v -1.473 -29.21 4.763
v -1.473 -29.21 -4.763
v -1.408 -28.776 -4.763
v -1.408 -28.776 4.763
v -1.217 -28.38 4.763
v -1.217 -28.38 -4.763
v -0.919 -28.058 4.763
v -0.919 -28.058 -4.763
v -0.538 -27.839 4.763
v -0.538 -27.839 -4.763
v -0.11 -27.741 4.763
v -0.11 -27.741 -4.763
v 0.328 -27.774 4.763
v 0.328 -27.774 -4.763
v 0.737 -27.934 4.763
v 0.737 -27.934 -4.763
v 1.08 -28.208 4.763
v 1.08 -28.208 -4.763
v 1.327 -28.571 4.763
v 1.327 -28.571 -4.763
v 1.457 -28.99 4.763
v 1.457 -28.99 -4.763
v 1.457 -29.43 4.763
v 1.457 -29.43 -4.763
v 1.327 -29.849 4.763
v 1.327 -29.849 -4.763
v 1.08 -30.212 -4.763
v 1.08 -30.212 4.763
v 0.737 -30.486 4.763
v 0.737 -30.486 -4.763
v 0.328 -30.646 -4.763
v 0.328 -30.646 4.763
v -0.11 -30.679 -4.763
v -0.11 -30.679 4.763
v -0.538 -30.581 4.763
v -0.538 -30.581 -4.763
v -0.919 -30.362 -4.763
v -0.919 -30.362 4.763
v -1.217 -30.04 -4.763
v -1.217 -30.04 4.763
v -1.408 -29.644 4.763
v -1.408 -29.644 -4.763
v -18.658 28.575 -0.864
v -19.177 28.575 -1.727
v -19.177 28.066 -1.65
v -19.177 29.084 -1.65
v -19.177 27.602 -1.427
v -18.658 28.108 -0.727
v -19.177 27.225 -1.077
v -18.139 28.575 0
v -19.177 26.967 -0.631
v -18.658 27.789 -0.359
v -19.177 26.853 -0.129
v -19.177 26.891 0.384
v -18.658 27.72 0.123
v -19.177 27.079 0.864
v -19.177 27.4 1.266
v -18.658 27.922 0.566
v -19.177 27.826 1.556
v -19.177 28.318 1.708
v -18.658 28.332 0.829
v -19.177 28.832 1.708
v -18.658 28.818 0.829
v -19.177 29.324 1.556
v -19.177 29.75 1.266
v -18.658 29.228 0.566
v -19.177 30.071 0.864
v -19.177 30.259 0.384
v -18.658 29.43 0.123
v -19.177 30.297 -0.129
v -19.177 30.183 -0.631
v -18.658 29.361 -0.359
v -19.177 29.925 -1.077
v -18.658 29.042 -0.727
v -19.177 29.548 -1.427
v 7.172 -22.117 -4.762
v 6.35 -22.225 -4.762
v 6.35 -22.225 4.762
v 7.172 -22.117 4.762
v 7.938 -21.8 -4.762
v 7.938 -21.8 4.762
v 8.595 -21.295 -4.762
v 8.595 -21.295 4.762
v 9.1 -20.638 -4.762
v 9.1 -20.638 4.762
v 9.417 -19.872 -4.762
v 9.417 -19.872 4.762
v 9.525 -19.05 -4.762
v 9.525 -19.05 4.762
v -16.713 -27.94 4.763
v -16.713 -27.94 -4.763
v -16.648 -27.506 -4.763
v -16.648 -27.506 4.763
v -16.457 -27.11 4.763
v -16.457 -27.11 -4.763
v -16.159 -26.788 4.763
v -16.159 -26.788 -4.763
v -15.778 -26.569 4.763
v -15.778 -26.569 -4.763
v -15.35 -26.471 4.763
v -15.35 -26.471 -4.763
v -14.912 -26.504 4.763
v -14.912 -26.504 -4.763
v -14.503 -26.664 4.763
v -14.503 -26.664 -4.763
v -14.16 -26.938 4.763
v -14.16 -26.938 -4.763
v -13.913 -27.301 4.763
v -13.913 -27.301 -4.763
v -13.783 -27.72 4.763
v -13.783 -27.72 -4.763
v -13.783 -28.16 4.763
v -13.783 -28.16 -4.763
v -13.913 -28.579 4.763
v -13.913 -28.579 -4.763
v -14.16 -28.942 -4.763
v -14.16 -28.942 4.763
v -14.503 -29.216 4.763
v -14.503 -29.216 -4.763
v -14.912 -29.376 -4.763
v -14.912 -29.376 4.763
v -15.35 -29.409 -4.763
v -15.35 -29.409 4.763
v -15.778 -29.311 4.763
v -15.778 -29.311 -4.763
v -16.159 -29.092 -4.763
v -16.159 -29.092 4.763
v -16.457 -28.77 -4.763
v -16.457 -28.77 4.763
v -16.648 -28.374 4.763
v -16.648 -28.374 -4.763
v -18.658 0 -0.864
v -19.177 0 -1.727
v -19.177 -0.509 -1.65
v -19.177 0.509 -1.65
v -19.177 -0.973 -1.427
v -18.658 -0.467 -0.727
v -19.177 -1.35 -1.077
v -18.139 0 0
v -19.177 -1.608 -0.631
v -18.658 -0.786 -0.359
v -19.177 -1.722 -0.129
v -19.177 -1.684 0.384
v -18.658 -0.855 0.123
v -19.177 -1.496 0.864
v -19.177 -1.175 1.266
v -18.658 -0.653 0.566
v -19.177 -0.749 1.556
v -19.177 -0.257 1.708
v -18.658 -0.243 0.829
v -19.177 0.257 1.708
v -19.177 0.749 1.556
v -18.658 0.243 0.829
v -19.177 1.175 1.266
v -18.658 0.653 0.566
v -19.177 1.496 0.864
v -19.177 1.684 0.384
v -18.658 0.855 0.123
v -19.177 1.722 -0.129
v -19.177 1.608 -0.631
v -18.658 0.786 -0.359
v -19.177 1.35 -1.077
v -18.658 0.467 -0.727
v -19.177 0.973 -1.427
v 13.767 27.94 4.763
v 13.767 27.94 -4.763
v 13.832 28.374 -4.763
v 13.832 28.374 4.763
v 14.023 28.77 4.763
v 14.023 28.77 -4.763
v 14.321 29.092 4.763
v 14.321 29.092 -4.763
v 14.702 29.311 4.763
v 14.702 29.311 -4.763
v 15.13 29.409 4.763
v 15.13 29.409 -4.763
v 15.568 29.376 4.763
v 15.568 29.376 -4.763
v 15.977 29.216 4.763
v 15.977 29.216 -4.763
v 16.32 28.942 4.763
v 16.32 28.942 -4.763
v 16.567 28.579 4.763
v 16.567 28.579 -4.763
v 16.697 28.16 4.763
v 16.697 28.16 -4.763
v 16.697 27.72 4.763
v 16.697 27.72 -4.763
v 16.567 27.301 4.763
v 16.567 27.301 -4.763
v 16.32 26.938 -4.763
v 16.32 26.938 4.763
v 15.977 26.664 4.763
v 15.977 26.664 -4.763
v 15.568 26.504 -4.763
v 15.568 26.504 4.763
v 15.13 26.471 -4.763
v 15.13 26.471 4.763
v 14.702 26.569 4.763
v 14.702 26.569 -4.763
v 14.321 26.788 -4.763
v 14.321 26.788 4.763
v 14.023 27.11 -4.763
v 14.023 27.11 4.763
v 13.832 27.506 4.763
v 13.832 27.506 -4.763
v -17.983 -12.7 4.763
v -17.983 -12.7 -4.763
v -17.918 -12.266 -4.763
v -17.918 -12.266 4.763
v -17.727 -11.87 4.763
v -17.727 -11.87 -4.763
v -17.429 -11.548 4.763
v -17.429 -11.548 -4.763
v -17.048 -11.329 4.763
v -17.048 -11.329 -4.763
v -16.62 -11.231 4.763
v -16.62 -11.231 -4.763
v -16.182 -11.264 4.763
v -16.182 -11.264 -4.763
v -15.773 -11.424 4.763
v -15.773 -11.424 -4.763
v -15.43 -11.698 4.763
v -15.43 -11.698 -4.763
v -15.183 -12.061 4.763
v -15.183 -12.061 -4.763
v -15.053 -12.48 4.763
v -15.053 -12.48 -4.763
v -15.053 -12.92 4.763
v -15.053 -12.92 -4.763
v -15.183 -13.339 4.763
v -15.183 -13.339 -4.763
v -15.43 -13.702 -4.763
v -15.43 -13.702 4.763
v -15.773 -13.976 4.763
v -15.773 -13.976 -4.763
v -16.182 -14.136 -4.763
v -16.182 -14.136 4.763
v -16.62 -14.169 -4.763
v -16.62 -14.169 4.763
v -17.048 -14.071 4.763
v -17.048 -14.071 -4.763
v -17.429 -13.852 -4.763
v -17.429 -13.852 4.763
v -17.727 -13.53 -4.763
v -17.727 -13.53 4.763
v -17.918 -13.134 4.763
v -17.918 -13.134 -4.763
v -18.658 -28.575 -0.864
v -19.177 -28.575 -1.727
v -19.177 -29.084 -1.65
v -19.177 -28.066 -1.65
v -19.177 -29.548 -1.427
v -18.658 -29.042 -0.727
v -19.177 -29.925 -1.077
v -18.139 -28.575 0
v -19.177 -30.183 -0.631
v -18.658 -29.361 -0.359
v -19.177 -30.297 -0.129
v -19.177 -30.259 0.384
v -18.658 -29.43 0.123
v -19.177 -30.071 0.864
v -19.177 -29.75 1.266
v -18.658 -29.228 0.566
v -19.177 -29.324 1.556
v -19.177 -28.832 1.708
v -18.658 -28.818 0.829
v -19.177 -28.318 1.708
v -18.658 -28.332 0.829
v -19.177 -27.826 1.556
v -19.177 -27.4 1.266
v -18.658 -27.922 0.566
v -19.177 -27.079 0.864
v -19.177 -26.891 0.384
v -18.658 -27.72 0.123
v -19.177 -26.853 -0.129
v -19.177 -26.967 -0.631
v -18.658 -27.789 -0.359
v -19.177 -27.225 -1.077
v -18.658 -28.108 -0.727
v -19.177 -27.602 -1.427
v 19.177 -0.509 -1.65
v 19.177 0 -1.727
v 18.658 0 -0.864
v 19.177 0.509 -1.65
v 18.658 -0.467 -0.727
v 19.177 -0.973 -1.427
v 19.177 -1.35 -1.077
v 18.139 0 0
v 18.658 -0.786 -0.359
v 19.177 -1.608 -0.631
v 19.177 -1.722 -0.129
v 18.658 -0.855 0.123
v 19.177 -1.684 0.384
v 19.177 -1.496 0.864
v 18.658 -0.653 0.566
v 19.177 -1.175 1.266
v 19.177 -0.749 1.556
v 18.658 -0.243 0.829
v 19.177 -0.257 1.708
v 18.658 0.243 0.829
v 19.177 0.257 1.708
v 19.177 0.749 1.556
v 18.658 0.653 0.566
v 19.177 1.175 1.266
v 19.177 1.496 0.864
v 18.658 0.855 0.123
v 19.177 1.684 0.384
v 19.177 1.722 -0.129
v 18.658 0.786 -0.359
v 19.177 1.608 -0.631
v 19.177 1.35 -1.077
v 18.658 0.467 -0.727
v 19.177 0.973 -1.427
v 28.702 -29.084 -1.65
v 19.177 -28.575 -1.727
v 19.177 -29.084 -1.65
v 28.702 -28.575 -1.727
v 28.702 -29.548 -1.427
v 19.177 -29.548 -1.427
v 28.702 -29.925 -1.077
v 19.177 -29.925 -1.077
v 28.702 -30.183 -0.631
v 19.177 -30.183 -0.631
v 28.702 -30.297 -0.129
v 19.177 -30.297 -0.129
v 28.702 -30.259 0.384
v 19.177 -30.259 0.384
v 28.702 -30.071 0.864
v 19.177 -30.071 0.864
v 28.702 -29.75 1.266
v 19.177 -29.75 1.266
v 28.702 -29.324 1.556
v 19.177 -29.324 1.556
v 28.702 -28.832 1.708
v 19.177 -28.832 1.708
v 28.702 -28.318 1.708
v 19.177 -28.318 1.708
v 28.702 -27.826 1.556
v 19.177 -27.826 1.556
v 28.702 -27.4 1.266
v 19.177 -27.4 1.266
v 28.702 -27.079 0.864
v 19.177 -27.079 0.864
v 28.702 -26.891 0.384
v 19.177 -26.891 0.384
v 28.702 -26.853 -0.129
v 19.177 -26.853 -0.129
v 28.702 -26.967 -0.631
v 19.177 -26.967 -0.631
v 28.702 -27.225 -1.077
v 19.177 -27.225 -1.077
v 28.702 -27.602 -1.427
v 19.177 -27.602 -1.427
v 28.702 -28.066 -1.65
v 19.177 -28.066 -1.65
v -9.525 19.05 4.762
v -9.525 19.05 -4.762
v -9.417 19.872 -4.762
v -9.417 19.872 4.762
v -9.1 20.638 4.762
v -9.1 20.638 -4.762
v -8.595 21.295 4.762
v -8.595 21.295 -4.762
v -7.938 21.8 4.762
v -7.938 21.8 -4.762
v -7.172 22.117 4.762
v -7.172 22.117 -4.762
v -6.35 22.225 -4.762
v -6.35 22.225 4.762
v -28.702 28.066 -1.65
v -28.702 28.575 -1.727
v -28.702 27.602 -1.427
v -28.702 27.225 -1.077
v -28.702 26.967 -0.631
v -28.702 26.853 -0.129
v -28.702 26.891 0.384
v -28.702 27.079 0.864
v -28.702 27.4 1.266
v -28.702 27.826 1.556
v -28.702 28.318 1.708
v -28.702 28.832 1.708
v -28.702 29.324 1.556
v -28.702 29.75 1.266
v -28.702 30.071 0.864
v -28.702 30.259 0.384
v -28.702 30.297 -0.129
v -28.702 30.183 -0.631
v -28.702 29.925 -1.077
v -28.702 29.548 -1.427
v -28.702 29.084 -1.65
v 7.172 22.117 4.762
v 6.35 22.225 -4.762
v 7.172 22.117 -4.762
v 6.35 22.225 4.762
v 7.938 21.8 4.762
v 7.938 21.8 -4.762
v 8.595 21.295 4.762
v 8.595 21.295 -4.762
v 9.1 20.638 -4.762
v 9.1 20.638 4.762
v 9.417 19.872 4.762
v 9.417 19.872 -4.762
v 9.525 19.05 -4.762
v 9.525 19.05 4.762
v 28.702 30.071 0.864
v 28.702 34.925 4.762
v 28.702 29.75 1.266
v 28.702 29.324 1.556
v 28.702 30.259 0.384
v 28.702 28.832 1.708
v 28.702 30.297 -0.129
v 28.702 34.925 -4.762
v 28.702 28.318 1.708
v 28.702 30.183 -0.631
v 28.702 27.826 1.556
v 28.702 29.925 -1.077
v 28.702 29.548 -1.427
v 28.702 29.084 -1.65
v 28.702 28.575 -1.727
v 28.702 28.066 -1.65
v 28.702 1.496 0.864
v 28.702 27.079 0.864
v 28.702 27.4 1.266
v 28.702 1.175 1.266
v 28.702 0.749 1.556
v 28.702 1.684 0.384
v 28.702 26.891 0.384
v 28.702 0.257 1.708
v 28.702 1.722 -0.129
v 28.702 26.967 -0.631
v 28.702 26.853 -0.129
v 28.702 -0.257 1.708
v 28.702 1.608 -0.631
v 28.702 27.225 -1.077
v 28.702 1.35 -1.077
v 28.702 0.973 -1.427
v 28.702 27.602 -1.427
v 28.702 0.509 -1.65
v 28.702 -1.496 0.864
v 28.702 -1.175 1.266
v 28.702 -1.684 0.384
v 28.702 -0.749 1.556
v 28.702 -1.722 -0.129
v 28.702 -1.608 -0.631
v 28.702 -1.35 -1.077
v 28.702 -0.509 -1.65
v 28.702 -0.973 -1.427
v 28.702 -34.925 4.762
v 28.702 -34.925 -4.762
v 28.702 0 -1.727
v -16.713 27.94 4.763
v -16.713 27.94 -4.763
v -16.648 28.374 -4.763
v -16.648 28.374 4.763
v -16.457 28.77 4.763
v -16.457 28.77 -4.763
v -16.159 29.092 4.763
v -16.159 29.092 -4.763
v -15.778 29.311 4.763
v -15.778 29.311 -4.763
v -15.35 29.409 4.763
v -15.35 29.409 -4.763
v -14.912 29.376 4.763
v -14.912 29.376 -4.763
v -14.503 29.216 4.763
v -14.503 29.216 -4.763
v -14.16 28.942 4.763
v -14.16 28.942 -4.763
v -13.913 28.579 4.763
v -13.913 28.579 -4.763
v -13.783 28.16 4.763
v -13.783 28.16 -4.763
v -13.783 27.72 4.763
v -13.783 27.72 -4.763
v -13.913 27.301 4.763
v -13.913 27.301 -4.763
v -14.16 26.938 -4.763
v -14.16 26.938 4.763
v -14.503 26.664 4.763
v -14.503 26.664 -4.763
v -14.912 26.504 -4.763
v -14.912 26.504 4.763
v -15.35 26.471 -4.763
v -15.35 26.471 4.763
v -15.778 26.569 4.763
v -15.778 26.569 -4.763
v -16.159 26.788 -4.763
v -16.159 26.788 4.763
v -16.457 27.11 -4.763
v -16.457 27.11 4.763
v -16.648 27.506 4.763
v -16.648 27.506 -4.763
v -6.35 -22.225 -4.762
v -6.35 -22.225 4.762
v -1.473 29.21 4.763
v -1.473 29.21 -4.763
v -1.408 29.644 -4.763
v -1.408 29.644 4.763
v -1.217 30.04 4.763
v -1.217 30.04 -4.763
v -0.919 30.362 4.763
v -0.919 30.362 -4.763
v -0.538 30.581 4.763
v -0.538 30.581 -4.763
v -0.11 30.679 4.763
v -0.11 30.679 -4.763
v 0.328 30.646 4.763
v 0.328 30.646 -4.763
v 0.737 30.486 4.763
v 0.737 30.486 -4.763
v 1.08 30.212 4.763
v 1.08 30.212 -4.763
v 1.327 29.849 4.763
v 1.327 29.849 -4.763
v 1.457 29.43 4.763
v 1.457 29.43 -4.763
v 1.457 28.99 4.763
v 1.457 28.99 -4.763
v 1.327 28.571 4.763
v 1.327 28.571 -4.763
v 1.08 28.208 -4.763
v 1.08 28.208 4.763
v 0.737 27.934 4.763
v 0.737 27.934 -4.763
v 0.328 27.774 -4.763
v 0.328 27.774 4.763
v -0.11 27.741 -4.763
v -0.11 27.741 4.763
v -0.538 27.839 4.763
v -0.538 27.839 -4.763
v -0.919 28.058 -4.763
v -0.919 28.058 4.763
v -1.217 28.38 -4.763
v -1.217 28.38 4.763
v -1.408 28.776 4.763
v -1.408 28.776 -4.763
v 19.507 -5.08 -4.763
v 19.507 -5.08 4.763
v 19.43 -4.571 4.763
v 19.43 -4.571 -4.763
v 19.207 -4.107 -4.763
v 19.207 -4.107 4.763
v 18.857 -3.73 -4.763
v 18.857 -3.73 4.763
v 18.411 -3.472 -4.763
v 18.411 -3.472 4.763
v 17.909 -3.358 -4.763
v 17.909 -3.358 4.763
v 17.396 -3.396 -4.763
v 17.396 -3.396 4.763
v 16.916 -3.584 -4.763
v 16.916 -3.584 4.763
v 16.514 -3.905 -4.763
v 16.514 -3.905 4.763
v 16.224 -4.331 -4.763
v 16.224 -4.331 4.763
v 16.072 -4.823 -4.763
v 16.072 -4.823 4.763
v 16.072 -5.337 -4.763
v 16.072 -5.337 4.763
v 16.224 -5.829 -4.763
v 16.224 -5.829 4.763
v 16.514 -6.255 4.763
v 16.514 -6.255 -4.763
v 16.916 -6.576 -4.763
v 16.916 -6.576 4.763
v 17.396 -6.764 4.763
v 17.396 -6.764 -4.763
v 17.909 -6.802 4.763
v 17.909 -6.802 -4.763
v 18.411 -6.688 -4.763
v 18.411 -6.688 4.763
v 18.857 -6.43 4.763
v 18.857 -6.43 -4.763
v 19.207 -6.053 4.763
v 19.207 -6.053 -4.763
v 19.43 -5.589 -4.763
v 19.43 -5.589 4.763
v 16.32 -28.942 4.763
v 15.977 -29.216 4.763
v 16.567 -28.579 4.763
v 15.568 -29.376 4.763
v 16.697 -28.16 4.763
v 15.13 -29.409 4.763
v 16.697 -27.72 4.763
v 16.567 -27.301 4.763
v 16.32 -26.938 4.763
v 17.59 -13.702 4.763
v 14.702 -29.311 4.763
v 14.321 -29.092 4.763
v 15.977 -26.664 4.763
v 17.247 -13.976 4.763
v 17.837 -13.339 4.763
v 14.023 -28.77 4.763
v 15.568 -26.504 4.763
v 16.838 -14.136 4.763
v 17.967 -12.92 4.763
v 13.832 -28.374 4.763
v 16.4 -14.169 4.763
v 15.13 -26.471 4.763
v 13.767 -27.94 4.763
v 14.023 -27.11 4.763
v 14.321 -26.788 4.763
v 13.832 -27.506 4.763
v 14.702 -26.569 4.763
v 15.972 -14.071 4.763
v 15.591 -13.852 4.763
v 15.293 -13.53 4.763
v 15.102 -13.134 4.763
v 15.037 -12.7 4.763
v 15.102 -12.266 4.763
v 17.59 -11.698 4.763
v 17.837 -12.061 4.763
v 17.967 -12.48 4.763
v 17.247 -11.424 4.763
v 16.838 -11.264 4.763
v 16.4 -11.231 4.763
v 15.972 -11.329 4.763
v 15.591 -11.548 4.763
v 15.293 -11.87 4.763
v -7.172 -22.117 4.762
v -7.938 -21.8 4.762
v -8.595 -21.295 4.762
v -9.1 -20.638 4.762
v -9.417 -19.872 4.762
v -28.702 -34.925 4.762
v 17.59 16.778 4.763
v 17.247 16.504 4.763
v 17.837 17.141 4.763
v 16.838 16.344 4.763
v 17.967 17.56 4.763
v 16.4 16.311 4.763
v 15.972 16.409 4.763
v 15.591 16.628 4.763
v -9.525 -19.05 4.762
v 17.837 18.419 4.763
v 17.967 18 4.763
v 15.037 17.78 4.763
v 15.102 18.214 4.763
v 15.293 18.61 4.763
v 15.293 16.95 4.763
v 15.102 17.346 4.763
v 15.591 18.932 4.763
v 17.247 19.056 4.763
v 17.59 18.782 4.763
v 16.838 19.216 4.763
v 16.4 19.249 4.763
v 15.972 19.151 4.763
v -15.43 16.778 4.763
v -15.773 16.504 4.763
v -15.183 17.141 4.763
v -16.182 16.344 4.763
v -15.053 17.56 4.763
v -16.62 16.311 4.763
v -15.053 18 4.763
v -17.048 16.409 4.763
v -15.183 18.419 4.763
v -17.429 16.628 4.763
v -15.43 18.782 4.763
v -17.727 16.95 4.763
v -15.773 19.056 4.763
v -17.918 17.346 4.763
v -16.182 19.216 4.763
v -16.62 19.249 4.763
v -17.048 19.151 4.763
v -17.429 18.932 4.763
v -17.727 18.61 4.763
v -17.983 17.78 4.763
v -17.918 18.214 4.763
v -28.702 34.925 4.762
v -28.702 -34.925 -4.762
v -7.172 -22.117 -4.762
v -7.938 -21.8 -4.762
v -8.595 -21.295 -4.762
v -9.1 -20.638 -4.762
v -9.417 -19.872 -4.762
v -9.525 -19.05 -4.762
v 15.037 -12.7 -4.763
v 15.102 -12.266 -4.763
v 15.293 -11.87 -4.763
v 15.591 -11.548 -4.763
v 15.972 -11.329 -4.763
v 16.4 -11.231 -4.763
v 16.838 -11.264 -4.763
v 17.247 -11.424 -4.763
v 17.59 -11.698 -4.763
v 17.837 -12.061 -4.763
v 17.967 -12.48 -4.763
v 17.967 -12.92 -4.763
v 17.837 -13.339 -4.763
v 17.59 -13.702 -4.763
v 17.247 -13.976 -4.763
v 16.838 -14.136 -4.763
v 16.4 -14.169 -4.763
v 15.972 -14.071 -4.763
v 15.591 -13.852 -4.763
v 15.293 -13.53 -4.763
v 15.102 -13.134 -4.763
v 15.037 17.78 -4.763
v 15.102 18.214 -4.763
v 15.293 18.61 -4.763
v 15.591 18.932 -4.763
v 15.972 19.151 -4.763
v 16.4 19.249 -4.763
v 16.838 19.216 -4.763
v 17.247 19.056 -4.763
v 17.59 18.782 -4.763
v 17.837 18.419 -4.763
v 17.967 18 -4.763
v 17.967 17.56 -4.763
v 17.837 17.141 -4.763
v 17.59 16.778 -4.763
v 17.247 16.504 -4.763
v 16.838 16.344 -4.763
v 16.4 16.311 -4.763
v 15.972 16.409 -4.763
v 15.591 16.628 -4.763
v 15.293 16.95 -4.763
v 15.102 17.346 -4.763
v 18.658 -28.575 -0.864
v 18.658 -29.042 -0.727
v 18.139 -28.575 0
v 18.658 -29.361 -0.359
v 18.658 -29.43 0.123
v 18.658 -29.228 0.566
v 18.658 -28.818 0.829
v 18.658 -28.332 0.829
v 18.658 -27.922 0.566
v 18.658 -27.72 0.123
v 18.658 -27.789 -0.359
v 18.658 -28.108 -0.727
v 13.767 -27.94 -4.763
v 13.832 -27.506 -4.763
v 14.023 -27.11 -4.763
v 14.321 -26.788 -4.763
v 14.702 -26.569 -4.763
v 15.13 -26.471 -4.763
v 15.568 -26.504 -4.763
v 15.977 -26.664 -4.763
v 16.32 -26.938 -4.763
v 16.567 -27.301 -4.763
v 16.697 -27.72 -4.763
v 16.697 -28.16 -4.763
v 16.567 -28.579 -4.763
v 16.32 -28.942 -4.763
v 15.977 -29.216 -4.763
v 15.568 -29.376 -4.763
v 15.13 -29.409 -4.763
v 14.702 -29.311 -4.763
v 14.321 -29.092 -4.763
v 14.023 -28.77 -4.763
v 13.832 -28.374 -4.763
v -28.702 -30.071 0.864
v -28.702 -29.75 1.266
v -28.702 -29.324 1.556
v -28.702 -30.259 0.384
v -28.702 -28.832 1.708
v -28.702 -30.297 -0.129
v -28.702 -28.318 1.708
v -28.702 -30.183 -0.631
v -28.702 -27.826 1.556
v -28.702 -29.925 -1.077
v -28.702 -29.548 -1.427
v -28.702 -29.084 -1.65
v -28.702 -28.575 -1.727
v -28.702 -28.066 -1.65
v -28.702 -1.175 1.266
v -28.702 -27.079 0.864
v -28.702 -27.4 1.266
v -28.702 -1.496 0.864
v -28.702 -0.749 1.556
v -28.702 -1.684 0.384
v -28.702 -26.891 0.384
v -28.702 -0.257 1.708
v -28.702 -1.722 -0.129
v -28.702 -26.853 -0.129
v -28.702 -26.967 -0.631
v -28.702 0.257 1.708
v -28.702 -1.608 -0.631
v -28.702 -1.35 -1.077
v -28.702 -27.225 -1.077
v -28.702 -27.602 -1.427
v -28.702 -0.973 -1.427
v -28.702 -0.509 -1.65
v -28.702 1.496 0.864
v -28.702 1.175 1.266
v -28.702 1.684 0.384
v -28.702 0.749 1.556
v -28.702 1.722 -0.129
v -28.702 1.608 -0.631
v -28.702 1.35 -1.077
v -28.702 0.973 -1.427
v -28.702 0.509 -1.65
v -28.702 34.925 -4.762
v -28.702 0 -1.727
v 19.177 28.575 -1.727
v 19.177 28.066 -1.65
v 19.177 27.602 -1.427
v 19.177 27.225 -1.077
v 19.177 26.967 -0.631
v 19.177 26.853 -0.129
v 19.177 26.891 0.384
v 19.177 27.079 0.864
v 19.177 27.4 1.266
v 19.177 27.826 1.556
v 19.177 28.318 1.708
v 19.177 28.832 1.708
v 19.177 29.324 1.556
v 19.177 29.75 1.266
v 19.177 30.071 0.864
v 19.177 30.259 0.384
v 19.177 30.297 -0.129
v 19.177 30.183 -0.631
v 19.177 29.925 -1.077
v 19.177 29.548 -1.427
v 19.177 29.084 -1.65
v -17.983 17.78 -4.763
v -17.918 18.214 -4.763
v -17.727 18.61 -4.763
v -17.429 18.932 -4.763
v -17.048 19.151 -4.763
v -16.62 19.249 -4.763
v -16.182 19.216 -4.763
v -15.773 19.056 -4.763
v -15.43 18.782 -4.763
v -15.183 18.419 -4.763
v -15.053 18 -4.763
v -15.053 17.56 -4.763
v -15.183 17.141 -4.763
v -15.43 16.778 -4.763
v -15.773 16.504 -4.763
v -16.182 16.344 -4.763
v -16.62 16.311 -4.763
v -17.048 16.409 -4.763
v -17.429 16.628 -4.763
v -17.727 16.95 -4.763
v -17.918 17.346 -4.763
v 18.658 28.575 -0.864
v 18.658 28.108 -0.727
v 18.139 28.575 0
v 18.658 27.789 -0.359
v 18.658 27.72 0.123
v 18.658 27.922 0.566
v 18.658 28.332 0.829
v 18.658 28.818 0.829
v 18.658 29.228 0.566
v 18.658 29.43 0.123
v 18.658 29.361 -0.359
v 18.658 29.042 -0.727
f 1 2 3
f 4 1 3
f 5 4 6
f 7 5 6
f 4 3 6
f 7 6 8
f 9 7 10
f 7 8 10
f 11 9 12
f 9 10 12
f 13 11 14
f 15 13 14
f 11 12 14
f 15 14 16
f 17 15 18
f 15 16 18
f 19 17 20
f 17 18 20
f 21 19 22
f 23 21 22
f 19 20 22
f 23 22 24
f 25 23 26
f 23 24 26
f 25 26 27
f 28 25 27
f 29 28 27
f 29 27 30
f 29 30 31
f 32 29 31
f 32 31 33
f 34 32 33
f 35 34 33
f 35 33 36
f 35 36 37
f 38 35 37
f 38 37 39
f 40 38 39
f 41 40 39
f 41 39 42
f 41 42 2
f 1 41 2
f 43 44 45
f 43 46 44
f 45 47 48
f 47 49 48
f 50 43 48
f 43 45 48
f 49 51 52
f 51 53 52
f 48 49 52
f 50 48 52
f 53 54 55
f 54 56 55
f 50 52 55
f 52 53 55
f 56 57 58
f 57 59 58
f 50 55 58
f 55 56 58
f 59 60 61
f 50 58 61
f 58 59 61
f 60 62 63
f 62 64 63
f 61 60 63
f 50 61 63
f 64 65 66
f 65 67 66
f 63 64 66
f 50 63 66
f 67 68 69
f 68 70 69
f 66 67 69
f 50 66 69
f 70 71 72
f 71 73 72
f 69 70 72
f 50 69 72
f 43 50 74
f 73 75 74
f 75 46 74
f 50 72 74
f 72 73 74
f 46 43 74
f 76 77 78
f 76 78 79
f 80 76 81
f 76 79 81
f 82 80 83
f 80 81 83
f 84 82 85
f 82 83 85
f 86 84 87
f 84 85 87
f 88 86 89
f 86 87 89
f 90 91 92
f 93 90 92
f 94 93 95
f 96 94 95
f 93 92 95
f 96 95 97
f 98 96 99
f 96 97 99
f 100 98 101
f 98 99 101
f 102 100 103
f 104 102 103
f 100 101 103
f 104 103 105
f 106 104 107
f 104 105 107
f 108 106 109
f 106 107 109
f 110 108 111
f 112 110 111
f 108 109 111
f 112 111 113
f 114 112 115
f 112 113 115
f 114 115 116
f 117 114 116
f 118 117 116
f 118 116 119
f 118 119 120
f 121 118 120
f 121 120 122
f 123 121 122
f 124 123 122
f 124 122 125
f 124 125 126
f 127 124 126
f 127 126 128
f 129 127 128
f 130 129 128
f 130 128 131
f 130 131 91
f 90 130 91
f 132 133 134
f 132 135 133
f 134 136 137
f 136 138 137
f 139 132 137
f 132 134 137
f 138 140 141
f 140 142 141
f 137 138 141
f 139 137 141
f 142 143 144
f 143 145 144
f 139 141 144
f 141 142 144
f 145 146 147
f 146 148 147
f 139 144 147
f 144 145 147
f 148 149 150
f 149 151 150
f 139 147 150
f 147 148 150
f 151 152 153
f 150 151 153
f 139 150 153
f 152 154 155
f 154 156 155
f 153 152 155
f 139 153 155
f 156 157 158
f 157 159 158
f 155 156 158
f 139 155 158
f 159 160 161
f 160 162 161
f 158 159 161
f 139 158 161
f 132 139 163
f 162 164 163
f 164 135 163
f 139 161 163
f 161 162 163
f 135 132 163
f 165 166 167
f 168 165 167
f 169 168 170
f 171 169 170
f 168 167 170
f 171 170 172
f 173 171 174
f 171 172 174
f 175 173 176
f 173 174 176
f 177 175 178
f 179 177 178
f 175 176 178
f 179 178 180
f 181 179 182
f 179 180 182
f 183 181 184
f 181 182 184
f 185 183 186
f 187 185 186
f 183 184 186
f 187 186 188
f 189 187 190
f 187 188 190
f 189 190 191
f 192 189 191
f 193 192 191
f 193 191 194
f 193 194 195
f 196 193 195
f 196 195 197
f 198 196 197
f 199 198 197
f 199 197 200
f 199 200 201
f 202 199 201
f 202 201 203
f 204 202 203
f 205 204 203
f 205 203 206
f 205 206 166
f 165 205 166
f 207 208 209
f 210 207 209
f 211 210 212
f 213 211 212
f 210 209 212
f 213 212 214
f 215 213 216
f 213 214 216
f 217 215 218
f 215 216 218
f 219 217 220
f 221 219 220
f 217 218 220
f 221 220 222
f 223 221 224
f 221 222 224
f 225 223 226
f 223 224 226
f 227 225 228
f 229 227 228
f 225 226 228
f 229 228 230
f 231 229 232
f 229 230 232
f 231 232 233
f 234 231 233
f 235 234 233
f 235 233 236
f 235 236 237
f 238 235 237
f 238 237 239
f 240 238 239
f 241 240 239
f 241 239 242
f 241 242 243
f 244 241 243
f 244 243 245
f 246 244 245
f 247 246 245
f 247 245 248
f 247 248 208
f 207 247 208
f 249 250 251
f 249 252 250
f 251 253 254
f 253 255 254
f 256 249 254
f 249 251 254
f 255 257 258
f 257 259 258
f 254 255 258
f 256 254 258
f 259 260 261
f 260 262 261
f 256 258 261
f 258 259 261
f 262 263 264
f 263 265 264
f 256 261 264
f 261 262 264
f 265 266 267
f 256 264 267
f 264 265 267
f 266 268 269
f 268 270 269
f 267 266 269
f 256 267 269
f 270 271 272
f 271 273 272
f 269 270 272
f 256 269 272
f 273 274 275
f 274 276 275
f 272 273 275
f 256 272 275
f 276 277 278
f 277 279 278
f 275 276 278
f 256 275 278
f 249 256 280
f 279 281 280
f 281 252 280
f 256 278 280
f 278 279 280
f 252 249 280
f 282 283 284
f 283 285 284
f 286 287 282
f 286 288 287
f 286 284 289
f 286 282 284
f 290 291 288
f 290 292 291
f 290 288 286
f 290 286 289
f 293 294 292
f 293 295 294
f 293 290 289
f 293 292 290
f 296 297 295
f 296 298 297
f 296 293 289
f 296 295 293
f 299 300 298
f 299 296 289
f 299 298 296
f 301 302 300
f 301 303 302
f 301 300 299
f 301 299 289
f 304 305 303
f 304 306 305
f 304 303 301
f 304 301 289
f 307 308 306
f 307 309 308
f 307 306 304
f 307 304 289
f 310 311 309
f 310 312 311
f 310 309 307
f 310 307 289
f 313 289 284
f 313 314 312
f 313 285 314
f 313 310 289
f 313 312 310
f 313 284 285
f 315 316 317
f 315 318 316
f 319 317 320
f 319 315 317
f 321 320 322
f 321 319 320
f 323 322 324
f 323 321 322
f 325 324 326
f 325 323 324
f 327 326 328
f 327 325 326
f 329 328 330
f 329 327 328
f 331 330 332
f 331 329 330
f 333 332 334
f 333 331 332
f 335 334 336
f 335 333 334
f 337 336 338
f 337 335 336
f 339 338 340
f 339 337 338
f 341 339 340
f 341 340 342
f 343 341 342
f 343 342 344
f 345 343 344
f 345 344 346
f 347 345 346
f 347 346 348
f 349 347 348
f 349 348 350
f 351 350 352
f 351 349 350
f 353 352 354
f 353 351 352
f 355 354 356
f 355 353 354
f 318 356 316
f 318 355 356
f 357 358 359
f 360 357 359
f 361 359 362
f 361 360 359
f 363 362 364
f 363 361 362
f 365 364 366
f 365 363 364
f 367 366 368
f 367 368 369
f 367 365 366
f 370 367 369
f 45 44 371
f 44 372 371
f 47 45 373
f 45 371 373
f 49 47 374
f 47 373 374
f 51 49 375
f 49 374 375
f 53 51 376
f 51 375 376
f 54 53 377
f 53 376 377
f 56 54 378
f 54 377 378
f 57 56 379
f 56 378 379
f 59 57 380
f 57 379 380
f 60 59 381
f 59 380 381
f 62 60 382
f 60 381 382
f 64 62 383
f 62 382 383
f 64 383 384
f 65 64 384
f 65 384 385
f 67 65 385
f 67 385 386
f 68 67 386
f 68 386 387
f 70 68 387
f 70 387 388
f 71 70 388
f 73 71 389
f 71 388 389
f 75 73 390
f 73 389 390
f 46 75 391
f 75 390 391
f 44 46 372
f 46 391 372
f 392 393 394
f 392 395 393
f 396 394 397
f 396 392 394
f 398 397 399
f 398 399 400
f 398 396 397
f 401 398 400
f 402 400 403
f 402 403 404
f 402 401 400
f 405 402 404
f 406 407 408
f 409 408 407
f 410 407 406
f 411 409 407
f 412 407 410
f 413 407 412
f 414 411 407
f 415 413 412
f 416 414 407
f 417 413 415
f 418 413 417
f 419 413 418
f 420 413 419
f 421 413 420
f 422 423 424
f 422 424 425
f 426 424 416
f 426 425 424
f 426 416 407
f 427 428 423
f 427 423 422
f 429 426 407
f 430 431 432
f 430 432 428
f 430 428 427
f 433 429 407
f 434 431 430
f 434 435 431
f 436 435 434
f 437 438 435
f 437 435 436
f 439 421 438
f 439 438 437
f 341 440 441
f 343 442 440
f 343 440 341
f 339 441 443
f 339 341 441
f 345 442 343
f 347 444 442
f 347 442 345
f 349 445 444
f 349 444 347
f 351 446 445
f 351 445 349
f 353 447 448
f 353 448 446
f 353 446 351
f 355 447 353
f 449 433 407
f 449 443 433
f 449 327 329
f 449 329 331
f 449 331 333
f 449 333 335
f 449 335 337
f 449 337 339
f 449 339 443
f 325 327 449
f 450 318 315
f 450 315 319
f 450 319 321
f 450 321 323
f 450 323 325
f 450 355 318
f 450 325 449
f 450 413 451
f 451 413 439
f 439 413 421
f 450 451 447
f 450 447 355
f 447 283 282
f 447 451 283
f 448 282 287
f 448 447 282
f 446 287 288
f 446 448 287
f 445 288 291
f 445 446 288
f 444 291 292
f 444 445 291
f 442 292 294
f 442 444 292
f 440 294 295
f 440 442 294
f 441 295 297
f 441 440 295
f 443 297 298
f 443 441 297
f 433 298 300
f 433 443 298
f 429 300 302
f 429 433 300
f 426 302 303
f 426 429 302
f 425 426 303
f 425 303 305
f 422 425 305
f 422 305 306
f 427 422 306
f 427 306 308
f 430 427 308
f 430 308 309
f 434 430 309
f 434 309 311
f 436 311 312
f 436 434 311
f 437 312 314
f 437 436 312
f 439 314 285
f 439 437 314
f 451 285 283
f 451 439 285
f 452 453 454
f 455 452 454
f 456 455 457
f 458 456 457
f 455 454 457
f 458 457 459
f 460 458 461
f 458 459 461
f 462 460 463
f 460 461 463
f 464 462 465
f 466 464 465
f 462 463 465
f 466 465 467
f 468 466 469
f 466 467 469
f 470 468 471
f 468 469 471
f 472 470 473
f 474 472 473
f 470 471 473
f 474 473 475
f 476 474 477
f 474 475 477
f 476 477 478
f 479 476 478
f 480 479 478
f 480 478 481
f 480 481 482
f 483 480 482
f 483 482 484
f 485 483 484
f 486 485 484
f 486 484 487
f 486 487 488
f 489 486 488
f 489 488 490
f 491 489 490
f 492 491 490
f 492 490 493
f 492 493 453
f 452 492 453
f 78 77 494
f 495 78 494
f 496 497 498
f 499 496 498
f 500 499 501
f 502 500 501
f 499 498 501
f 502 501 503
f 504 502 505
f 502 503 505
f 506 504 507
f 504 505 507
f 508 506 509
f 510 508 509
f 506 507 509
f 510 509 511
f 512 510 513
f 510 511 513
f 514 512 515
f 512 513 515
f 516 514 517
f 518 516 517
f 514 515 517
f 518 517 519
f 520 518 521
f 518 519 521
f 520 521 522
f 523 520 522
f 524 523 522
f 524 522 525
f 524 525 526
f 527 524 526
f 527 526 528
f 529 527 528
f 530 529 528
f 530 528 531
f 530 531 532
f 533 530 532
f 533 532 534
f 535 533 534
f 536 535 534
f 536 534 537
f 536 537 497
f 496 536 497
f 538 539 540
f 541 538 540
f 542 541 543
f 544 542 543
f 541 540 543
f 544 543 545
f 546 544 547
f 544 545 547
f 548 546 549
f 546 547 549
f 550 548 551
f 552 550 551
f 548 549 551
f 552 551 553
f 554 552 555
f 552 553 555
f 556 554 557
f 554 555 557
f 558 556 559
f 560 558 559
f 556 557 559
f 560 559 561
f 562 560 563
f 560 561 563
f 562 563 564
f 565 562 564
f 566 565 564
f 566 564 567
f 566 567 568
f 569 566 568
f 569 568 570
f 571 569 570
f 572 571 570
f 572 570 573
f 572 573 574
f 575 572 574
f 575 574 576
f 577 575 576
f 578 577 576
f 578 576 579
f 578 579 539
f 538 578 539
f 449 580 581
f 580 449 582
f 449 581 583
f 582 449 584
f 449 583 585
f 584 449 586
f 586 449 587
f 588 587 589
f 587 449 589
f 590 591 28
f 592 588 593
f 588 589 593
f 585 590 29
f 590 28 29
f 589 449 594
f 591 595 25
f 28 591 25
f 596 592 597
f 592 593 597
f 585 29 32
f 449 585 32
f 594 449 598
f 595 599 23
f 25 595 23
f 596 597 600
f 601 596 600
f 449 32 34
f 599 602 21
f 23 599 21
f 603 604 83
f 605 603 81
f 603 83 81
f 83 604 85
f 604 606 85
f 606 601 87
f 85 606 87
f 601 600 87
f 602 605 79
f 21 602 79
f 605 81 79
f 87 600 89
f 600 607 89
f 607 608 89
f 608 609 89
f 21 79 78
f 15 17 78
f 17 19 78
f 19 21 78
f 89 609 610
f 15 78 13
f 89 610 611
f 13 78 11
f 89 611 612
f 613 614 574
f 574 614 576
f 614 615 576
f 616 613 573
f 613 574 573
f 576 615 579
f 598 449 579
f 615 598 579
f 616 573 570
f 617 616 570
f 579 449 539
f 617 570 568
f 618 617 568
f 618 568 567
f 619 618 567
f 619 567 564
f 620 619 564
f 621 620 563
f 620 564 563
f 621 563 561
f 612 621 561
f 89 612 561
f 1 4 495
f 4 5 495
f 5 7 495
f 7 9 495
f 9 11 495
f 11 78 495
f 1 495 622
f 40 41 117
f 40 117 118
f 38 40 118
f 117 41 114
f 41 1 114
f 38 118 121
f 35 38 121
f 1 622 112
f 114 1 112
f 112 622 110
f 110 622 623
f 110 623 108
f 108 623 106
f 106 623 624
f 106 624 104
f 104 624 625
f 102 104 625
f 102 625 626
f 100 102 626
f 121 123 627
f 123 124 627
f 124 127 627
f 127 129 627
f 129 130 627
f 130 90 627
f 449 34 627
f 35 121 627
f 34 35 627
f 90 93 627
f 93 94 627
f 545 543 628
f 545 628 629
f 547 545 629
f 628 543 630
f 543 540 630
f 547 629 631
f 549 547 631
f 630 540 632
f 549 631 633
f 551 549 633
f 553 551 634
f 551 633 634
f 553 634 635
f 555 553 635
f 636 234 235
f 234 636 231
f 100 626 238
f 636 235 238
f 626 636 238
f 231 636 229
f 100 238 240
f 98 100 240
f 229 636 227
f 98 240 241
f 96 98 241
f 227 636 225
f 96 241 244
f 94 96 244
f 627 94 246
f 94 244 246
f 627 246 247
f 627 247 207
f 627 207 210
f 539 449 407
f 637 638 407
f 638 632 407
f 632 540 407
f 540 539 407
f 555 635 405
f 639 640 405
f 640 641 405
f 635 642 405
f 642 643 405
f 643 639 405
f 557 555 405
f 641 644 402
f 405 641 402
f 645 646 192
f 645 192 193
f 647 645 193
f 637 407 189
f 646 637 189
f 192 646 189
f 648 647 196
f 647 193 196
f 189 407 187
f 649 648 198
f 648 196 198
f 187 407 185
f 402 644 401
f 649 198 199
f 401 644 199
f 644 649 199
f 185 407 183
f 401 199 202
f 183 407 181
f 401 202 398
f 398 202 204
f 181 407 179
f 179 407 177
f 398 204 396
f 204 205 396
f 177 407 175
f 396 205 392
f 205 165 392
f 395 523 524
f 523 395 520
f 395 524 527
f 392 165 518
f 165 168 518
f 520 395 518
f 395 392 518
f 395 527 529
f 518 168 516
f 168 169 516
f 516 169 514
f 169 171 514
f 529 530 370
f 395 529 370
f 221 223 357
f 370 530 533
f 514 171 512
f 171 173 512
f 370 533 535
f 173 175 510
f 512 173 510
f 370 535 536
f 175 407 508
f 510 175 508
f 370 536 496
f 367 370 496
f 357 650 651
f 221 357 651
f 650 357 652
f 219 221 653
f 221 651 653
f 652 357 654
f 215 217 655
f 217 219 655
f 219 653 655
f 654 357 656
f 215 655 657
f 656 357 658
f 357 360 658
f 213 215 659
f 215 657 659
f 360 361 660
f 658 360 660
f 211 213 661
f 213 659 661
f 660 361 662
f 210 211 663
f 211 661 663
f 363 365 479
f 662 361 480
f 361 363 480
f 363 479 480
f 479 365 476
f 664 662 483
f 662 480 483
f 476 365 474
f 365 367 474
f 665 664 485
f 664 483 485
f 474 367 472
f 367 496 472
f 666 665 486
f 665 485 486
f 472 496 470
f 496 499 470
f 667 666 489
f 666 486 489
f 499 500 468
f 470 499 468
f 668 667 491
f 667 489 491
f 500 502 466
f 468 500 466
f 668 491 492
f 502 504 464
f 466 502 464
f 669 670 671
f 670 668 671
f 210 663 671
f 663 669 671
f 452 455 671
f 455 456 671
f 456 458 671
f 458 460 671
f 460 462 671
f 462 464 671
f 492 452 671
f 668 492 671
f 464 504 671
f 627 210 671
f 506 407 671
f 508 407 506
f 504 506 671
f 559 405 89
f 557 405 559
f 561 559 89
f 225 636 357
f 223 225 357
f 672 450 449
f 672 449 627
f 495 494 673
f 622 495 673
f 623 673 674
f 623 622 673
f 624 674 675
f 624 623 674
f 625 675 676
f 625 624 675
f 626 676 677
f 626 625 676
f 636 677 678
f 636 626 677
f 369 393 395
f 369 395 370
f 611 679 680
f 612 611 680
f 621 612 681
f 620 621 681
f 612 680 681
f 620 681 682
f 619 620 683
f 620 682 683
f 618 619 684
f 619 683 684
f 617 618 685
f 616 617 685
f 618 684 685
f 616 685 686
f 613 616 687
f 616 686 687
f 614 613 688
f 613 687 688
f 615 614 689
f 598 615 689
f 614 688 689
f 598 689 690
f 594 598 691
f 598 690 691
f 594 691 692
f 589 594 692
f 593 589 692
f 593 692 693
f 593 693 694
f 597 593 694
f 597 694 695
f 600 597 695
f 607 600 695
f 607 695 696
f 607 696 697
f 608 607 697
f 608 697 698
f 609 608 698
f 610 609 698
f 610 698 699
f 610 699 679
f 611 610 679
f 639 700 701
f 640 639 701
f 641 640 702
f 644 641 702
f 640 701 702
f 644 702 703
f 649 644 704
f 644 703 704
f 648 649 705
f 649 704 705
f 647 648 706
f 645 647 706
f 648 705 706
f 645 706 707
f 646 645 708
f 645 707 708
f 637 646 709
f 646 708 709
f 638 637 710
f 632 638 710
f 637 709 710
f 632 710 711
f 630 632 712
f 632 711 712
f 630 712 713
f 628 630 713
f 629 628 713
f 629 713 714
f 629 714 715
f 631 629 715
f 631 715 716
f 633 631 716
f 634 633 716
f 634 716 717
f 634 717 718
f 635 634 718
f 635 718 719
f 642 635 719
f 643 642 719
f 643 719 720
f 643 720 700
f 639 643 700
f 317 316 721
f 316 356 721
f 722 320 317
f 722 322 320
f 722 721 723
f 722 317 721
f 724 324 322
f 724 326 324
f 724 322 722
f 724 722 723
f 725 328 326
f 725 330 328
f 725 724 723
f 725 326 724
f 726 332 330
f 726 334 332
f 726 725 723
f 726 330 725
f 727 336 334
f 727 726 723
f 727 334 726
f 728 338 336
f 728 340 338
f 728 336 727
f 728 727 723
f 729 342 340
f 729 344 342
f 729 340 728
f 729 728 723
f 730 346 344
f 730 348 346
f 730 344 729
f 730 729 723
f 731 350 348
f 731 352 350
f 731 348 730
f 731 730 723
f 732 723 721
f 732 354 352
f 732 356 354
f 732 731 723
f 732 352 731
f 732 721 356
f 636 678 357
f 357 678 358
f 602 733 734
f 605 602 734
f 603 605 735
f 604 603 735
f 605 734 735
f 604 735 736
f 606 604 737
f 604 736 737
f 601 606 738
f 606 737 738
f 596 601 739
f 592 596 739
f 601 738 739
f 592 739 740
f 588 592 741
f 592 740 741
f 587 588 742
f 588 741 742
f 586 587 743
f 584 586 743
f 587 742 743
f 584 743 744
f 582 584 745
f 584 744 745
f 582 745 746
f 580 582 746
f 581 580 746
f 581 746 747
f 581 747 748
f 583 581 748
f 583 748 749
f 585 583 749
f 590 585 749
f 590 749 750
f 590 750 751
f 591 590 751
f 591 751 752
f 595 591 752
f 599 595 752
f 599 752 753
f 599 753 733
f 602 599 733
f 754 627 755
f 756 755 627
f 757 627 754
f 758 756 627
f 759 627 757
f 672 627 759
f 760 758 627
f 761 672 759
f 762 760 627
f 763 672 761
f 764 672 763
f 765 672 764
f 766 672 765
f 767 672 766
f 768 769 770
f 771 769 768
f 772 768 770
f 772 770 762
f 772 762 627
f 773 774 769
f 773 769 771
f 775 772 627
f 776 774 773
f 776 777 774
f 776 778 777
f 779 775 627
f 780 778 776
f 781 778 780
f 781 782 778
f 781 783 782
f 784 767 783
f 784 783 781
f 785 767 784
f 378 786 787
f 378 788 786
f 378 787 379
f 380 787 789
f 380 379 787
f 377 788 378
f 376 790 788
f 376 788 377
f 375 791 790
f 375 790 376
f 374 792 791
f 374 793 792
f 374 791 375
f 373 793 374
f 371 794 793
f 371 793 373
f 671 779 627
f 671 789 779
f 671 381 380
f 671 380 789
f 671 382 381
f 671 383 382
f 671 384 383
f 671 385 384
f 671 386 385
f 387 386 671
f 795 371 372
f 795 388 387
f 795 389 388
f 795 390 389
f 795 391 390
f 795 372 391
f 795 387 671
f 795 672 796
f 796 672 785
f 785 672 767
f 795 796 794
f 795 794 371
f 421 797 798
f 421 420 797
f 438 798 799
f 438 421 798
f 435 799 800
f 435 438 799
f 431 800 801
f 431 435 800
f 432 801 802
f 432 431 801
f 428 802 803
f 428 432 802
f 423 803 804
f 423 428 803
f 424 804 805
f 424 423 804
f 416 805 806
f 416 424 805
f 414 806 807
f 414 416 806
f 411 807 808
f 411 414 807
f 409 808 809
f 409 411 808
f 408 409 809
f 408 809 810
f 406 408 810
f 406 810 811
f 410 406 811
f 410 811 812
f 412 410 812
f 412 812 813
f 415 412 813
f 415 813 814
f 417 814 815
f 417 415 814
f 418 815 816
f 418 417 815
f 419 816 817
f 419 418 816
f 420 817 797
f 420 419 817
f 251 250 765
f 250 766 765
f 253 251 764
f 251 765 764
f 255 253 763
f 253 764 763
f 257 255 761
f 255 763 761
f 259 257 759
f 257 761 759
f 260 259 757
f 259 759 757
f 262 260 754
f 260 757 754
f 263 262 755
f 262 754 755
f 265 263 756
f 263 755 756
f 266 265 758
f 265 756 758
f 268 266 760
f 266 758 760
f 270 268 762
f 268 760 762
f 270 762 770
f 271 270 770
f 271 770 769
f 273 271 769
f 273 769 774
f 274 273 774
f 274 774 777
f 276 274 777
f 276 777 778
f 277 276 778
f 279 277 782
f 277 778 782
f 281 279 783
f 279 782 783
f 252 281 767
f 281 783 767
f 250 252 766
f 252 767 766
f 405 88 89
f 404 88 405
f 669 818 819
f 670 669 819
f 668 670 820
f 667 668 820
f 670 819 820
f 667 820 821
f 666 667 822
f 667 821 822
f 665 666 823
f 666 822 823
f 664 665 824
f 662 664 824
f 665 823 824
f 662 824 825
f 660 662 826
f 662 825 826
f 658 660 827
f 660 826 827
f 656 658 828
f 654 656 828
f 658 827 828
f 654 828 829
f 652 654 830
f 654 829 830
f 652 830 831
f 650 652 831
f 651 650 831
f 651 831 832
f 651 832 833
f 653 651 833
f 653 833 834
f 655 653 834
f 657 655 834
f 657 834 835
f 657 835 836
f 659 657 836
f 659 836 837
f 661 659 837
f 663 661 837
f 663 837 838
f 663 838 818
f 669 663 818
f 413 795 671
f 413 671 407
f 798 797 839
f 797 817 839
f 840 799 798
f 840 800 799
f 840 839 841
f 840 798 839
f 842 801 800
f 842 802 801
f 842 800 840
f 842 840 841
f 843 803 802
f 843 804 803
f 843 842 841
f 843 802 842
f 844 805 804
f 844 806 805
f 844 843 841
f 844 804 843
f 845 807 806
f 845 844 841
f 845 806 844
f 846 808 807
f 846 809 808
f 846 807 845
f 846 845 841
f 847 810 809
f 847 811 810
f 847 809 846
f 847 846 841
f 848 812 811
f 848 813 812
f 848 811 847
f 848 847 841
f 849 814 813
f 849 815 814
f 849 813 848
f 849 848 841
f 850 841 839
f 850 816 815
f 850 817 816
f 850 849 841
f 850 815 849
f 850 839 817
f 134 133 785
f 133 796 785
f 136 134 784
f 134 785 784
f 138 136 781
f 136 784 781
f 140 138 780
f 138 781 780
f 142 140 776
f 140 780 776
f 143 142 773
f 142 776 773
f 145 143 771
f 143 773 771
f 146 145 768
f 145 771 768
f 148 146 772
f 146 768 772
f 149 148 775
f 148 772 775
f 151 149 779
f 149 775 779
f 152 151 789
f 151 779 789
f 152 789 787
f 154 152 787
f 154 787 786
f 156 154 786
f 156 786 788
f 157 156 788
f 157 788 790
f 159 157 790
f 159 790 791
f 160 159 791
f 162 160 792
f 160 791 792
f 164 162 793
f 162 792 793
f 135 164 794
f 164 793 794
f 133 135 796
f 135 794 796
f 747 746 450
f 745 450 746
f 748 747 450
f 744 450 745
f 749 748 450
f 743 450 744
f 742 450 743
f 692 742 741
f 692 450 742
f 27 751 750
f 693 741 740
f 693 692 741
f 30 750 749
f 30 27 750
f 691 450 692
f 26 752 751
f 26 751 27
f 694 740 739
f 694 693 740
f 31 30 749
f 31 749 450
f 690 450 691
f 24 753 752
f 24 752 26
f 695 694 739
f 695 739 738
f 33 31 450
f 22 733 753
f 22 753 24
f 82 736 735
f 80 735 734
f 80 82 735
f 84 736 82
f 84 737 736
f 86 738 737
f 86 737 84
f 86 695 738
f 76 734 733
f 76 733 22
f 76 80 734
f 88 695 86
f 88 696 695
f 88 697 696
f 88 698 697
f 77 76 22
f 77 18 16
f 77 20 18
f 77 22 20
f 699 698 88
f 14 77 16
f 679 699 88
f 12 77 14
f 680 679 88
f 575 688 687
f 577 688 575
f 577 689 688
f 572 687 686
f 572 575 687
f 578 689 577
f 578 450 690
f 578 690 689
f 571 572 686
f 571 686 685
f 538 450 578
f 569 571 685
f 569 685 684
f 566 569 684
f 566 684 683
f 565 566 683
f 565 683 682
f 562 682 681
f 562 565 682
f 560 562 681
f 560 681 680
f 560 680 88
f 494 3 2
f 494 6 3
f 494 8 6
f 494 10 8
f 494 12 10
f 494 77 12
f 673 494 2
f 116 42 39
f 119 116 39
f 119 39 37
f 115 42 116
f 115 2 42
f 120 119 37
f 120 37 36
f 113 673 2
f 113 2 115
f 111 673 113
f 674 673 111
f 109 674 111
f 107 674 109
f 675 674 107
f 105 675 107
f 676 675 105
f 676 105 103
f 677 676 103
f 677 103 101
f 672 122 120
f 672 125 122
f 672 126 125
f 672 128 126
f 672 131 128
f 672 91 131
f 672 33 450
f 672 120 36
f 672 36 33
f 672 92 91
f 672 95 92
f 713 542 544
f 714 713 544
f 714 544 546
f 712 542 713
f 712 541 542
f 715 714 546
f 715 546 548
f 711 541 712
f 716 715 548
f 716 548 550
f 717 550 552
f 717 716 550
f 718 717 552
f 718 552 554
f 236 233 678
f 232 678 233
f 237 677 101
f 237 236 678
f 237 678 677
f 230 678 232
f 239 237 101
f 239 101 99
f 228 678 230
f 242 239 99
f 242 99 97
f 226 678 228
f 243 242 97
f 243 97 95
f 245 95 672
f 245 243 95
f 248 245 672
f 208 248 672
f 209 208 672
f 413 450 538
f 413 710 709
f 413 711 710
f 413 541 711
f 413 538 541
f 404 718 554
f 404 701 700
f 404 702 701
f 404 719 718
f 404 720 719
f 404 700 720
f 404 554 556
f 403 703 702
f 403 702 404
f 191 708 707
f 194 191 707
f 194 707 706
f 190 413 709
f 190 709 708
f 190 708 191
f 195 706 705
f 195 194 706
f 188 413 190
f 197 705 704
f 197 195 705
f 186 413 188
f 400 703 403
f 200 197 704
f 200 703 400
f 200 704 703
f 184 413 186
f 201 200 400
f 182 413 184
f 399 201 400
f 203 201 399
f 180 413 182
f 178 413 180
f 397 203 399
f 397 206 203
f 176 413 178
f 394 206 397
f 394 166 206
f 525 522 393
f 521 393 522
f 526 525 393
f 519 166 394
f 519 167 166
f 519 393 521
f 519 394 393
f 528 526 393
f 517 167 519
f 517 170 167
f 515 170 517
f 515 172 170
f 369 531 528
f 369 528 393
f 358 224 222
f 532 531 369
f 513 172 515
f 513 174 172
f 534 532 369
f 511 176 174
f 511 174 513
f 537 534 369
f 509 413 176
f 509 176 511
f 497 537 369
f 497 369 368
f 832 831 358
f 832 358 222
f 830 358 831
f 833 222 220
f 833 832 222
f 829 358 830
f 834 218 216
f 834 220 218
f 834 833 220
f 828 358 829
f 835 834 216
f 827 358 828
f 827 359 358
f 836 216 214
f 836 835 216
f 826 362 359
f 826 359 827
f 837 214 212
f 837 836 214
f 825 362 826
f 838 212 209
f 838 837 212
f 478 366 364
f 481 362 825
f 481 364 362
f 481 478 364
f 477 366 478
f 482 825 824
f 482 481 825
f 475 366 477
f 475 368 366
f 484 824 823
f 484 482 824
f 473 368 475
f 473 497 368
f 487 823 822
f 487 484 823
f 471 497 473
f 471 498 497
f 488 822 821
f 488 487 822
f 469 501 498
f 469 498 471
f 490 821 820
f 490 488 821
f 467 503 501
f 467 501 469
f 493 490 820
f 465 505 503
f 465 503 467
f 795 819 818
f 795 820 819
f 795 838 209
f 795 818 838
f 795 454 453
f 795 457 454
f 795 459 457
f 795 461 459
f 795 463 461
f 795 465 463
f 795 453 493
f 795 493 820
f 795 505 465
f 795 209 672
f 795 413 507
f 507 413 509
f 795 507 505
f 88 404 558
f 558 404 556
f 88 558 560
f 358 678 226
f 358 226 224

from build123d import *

# Parameters (mm, degrees)
SKETCH2_W                      = 38.1
SKETCH2_H                      = 69.85
BOSS_EXTRUDE1_DEPTH            = 4.7625
FILLET1_R                      = 6.35
F_4_CLEARANCE_HOLE1_D          = 2.9464
BOSS_EXTRUDE2_DEPTH            = 9.525
F_8_32_TAPPED_HOLE1_AT_2_COUNT = 2
F_8_32_TAPPED_HOLE1_AT_2_PITCH = 28.575
F_8_32_TAPPED_HOLE1_AT_3_COUNT = 2
F_8_32_TAPPED_HOLE1_AT_3_PITCH = 28.575
SKETCH12_W                     = 19.05
SKETCH12_H                     = 44.45
CUT_EXTRUDE1_DEPTH             = 47.198333888
FILLET2_R                      = 3.175
F_8_32_TAPPED_HOLE2_D          = 3.4544


with BuildPart() as part:
    # Sketch2 → Boss-Extrude1 (new, symmetric)
    with BuildSketch(Plane.XY):
        Rectangle(SKETCH2_W, SKETCH2_H)
    extrude(amount=BOSS_EXTRUDE1_DEPTH, both=True)

    # Fillet1
    fillet1_edges = [part.edges().sort_by_distance(p)[0] for p in [
        (19.05, -34.925, 0),
        (-19.05, -34.925, 0),
        (-19.05, 34.925, 0),
        (19.05, 34.925, 0),
    ]]
    fillet(fillet1_edges, radius=FILLET1_R)

    # #4 Clearance Hole1 (through all)
    with Locations(Plane.XY.offset(4.7625)):
        with Locations((0, 29.21), (-15.24, 27.94), (15.24, 27.94), (-15.24, -27.94), (15.24, -27.94), (-16.51, 17.78), (-16.51, -12.7), (16.51, 17.78), (16.51, -12.7), (0, -29.21)):
            Hole(F_4_CLEARANCE_HOLE1_D / 2)

    # Sketch6 → Boss-Extrude2 (add)
    with BuildSketch(Plane(origin=(0, 0, -4.7625), x_dir=(-1, 0, 0), z_dir=(0, 0, -1))):
        with BuildLine():
            Line((-28.702, -34.925), (-12.7, -34.925))
            ThreePointArc((-12.7, -34.925), (-17.190128061, -33.065128061), (-19.05, -28.575))
            Line((-19.05, -28.575), (-19.05, 28.575))
            ThreePointArc((-19.05, 28.575), (-17.190128061, 33.065128061), (-12.7, 34.925))
            Line((-12.7, 34.925), (-28.702, 34.925))
            Line((-28.702, 34.925), (-28.702, -34.925))
        make_face()
        with BuildLine():
            Line((28.702, -34.925), (28.702, 34.925))
            Line((28.702, 34.925), (12.7, 34.925))
            ThreePointArc((12.7, 34.925), (17.190128061, 33.065128061), (19.05, 28.575))
            Line((19.05, 28.575), (19.05, -28.575))
            ThreePointArc((19.05, -28.575), (17.190128061, -33.065128061), (12.7, -34.925))
            Line((12.7, -34.925), (28.702, -34.925))
        make_face()
    extrude(amount=-BOSS_EXTRUDE2_DEPTH)

    # Sketch11 → #8-32 Tapped Hole1 (revolve, cut)
    with BuildSketch(Plane(origin=(28.702, 0, 0), x_dir=(0, 0, -1), z_dir=(0, 1, 0))):
        Polygon((0, 0), (0, 10.562806461), (1.7272, 9.525), (1.7272, 0), align=None)
    f_8_32_tapped_hole1 = revolve(axis=Axis((35.052, 0, 0), (-1, 0, 0)), mode=Mode.SUBTRACT)

    # #8-32 Tapped Hole1 at 2: #8-32 Tapped Hole1 ×2
    with Locations(*[(0, i * F_8_32_TAPPED_HOLE1_AT_2_PITCH, 0) for i in range(1, F_8_32_TAPPED_HOLE1_AT_2_COUNT)]):
        add(f_8_32_tapped_hole1, mode=Mode.SUBTRACT)

    # #8-32 Tapped Hole1 at 3: #8-32 Tapped Hole1 ×2
    with Locations(*[(0, -i * F_8_32_TAPPED_HOLE1_AT_3_PITCH, 0) for i in range(1, F_8_32_TAPPED_HOLE1_AT_3_COUNT)]):
        add(f_8_32_tapped_hole1, mode=Mode.SUBTRACT)

    # Mirror1: #8-32 Tapped Hole1 across plane
    add(f_8_32_tapped_hole1.mirror(Plane(origin=(0, 0, 0), x_dir=(0, 0, 1), z_dir=(1, 0, 0))), mode=Mode.SUBTRACT)

    # Mirror1 copy 1 sketch → Mirror1 copy 1 (revolve, cut)
    with BuildSketch(Plane(origin=(-28.702, 28.575, 0), x_dir=(0, 0, -1), z_dir=(0, 1, 0))):
        Polygon((0, 0), (0, -10.562806461), (1.7272, -9.525), (1.7272, 0), align=None)
    revolve(axis=Axis((-35.052, 28.575, 0), (-1, 0, 0)), mode=Mode.SUBTRACT)

    # Mirror1 copy 2 sketch → Mirror1 copy 2 (revolve, cut)
    with BuildSketch(Plane(origin=(-28.702, -28.575, 0), x_dir=(0, 0, -1), z_dir=(0, 1, 0))):
        Polygon((0, 0), (0, -10.562806461), (1.7272, -9.525), (1.7272, 0), align=None)
    revolve(axis=Axis((-35.052, -28.575, 0), (-1, 0, 0)), mode=Mode.SUBTRACT)

    # Sketch12 → Cut-Extrude1 (cut, through all)
    with BuildSketch(Plane(origin=(0, 0, -4.7625), x_dir=(-1, 0, 0), z_dir=(0, 0, -1))):
        Rectangle(SKETCH12_W, SKETCH12_H)
    extrude(amount=-CUT_EXTRUDE1_DEPTH, mode=Mode.SUBTRACT)

    # Fillet2
    fillet2_edges = [part.edges().sort_by_distance(p)[0] for p in [
        (-9.525, 22.225, 0),
        (-9.525, -22.225, 0),
        (9.525, -22.225, 0),
        (9.525, 22.225, 0),
    ]]
    fillet(fillet2_edges, radius=FILLET2_R)

    # #8-32 Tapped Hole2 (through all)
    with Locations(Plane(origin=(0, 0, -4.7625), x_dir=(-1, 0, 0), z_dir=(0, 0, -1))):
        with Locations((-17.78, -5.08)):
            Hole(F_8_32_TAPPED_HOLE2_D / 2)


solid = part.part
